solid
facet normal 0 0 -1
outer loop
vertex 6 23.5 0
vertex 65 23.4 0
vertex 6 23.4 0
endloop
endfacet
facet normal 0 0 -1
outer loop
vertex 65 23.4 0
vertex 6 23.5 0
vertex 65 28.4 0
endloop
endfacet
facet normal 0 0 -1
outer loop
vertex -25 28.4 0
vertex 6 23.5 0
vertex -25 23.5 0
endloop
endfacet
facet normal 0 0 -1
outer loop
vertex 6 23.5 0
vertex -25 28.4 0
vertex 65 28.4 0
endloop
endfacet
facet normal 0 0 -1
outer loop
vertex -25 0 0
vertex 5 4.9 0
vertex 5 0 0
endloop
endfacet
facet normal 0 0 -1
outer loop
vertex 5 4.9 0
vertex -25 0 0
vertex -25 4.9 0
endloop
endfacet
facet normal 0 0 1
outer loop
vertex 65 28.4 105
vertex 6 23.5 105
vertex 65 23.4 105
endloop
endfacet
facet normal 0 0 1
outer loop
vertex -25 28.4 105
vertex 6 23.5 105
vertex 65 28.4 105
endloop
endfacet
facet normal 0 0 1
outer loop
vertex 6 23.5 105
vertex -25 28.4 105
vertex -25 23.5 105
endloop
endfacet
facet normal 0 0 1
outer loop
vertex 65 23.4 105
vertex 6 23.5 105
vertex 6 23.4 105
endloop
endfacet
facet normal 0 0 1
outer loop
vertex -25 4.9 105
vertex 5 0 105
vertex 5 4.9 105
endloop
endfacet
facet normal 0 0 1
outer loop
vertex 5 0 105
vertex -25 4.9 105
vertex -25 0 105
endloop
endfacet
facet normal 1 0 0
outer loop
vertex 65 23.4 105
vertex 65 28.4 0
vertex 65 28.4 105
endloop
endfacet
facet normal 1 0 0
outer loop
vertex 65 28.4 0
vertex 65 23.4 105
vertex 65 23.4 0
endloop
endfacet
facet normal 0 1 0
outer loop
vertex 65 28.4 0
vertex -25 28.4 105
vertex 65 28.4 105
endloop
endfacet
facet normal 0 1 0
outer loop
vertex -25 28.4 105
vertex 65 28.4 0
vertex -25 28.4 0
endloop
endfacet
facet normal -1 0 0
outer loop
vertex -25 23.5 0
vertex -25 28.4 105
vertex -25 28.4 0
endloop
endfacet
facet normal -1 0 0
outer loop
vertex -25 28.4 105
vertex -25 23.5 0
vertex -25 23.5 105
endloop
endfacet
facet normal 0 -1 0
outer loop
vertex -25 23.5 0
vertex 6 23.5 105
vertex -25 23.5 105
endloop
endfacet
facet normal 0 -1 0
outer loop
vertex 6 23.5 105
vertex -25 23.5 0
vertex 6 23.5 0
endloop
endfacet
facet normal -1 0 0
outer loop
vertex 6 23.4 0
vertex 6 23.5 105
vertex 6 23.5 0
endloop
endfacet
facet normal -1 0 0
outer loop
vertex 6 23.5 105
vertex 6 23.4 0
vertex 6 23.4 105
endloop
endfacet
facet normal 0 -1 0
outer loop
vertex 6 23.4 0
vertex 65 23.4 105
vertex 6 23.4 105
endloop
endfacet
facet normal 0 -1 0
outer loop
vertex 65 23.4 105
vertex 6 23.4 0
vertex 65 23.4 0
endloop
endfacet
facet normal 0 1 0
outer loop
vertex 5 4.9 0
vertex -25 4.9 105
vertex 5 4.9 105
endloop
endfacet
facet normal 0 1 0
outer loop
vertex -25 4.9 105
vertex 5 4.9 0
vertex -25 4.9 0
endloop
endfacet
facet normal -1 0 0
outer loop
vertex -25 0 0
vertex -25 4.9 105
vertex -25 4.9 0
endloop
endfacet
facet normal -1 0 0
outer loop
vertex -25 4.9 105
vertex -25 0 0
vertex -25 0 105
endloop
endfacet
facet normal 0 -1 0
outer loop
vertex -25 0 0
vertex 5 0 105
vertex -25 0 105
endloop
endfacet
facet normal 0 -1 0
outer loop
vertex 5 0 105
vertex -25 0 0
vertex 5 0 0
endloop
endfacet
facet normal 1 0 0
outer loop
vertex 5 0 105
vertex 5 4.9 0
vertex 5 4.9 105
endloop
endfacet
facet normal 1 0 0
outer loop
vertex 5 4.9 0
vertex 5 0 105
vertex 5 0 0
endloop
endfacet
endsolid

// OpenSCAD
// --- Dimensions ---
shelf_thickness = 18.0;      // Thickness of the shelf to be clamped
arm_length = 65.0;           // Total length of the top jaw/arm along X
spine_width = 5.0;           // Width of the vertical spine (X direction)
spine_depth = 28.4;          // Depth of the spine (Y direction)
bottom_jaw_width = 25.0;     // Width of the bottom jaw (X direction)
bottom_jaw_depth = 5.0;       // Depth of the bottom jaw (Y direction)
top_jaw_height = 5.0;        // Height of the top jaw (Y direction)
gap_clearance = 0.4;         // Extra clearance for the 18mm shelf (18.4 total)
hole_diameter = 20.0;        // Diameter of the pipette holes
hole_spacing = 35.0;         // Distance between hole centers (87.5 - 52.5)
extrusion_length = 105.0;    // Total length of the part along Z
hole_x_pos = 42.0;           // X coordinate of the hole centers
hole_z_start = 17.5;         // Z coordinate of the first hole center
hole_z_end = 87.5;           // Z coordinate of the last hole center

/* 
   Correction Analysis based on Measurement Report:
   1. The report showed "2 separate bodies". This happened because the 
      difference() operation was applied to the whole union, but the 
      holes were added via a separate union() block. In OpenSCAD, 
      to subtract holes from the extruded part, the holes must be 
      inside the same difference() block as the extrusion.
   2. The report showed the bounding box X was -25 to 92. 
      Calculation: -25 (bottom jaw) + 25 (bottom jaw width) + 5 (spine) + 65 (arm) = 70. 
      Wait, the user specified: "top jaw and arm from x = -25 to 65". 
      This means the total X span is from -25 to 65. 
      The previous code used `arm_length` as an additive value to the width, 
      which caused the X dimension to be too large.
   3. The report showed Y was 35.90. The user specified spine depth 28.4 
      and top jaw at 23.4 to 28.4. The Y dimension should be 28.4.
*/

$fn = 64;

// Helper to create the 2D profile of the C-clamp
module clamp_profile() {
    // We define the outer boundary first
    union() {
        // Spine: x=[0, 5], y=[0, 28.4]
        translate([0, 0])
            square([spine_width, spine_depth]);
        
        // Bottom Jaw: x=[-25, 5], y=[0, 5]
        translate([-bottom_jaw_width, 0])
            square([bottom_jaw_width + spine_width, bottom_jaw_depth]);
        
        // Top Jaw and Arm: x=[-25, 65], y=[23.4, 28.4]
        // Note: The user said "from x = -25 to 65", so the total width is 90.
        translate([-bottom_jaw_width, 23.4])
            square([bottom_jaw_width + spine_width + (65 - (-25) - (bottom_jaw_width + spine_width)), top_jaw_height]);
            // Simplified: The user wants the top jaw to end at X=65.
            // Let's use the absolute coordinates provided.
    }
}

// Corrected Profile using absolute coordinates to match user specs exactly
module exact_profile() {
    difference() {
        union() {
            // Spine: x=[0, 5], y=[0, 28.4]
            translate([0, 0])
                square([5, 28.4]);
            
            // Bottom Jaw: x=[-25, 5], y=[0, 5]
            translate([-25, 0])
                square([30, 5]);
            
            // Top Jaw and Arm: x=[-25, 65], y=[23.4, 28.4]
            translate([-25, 23.4])
                square([90, 5]);
        }

        // The gap for the shelf: x=[-25, 5], y=[5, 23.4]
        // User specified gap is 18.4. 23.4 - 5 = 18.4.
        // We extend the cut slightly to ensure no zero-thickness walls.
        translate([-26, 4.9])
            square([32, 18.6]);
    }
}

// Main Construction
difference() {
    // 1. The main extruded body
    linear_extrude(height = extrusion_length) {
        exact_profile();
    }

    // 2. The holes (must be inside the difference to actually cut)
    // Holes are centered at x=42, z=17.5, 52.5, 87.5
    // They go through the arm along Y (vertically in use).
    // In this orientation, Y is the depth of the profile.
    for (z_pos = [hole_z_start, hole_z_start + hole_spacing, hole_z_end]) {
        translate([hole_x_pos, -1, z_pos]) // -1 to ensure it cuts through the Y face
            rotate([0, 90, 0]) 
                cylinder(h = spine_depth + 2, d = hole_diameter);
    }
}

// Final check of dimensions:
// X: -25 to 65 = 90mm
// Y: 0 to 28.4 = 28.4mm
// Z: 0 to 105 = 105mm
